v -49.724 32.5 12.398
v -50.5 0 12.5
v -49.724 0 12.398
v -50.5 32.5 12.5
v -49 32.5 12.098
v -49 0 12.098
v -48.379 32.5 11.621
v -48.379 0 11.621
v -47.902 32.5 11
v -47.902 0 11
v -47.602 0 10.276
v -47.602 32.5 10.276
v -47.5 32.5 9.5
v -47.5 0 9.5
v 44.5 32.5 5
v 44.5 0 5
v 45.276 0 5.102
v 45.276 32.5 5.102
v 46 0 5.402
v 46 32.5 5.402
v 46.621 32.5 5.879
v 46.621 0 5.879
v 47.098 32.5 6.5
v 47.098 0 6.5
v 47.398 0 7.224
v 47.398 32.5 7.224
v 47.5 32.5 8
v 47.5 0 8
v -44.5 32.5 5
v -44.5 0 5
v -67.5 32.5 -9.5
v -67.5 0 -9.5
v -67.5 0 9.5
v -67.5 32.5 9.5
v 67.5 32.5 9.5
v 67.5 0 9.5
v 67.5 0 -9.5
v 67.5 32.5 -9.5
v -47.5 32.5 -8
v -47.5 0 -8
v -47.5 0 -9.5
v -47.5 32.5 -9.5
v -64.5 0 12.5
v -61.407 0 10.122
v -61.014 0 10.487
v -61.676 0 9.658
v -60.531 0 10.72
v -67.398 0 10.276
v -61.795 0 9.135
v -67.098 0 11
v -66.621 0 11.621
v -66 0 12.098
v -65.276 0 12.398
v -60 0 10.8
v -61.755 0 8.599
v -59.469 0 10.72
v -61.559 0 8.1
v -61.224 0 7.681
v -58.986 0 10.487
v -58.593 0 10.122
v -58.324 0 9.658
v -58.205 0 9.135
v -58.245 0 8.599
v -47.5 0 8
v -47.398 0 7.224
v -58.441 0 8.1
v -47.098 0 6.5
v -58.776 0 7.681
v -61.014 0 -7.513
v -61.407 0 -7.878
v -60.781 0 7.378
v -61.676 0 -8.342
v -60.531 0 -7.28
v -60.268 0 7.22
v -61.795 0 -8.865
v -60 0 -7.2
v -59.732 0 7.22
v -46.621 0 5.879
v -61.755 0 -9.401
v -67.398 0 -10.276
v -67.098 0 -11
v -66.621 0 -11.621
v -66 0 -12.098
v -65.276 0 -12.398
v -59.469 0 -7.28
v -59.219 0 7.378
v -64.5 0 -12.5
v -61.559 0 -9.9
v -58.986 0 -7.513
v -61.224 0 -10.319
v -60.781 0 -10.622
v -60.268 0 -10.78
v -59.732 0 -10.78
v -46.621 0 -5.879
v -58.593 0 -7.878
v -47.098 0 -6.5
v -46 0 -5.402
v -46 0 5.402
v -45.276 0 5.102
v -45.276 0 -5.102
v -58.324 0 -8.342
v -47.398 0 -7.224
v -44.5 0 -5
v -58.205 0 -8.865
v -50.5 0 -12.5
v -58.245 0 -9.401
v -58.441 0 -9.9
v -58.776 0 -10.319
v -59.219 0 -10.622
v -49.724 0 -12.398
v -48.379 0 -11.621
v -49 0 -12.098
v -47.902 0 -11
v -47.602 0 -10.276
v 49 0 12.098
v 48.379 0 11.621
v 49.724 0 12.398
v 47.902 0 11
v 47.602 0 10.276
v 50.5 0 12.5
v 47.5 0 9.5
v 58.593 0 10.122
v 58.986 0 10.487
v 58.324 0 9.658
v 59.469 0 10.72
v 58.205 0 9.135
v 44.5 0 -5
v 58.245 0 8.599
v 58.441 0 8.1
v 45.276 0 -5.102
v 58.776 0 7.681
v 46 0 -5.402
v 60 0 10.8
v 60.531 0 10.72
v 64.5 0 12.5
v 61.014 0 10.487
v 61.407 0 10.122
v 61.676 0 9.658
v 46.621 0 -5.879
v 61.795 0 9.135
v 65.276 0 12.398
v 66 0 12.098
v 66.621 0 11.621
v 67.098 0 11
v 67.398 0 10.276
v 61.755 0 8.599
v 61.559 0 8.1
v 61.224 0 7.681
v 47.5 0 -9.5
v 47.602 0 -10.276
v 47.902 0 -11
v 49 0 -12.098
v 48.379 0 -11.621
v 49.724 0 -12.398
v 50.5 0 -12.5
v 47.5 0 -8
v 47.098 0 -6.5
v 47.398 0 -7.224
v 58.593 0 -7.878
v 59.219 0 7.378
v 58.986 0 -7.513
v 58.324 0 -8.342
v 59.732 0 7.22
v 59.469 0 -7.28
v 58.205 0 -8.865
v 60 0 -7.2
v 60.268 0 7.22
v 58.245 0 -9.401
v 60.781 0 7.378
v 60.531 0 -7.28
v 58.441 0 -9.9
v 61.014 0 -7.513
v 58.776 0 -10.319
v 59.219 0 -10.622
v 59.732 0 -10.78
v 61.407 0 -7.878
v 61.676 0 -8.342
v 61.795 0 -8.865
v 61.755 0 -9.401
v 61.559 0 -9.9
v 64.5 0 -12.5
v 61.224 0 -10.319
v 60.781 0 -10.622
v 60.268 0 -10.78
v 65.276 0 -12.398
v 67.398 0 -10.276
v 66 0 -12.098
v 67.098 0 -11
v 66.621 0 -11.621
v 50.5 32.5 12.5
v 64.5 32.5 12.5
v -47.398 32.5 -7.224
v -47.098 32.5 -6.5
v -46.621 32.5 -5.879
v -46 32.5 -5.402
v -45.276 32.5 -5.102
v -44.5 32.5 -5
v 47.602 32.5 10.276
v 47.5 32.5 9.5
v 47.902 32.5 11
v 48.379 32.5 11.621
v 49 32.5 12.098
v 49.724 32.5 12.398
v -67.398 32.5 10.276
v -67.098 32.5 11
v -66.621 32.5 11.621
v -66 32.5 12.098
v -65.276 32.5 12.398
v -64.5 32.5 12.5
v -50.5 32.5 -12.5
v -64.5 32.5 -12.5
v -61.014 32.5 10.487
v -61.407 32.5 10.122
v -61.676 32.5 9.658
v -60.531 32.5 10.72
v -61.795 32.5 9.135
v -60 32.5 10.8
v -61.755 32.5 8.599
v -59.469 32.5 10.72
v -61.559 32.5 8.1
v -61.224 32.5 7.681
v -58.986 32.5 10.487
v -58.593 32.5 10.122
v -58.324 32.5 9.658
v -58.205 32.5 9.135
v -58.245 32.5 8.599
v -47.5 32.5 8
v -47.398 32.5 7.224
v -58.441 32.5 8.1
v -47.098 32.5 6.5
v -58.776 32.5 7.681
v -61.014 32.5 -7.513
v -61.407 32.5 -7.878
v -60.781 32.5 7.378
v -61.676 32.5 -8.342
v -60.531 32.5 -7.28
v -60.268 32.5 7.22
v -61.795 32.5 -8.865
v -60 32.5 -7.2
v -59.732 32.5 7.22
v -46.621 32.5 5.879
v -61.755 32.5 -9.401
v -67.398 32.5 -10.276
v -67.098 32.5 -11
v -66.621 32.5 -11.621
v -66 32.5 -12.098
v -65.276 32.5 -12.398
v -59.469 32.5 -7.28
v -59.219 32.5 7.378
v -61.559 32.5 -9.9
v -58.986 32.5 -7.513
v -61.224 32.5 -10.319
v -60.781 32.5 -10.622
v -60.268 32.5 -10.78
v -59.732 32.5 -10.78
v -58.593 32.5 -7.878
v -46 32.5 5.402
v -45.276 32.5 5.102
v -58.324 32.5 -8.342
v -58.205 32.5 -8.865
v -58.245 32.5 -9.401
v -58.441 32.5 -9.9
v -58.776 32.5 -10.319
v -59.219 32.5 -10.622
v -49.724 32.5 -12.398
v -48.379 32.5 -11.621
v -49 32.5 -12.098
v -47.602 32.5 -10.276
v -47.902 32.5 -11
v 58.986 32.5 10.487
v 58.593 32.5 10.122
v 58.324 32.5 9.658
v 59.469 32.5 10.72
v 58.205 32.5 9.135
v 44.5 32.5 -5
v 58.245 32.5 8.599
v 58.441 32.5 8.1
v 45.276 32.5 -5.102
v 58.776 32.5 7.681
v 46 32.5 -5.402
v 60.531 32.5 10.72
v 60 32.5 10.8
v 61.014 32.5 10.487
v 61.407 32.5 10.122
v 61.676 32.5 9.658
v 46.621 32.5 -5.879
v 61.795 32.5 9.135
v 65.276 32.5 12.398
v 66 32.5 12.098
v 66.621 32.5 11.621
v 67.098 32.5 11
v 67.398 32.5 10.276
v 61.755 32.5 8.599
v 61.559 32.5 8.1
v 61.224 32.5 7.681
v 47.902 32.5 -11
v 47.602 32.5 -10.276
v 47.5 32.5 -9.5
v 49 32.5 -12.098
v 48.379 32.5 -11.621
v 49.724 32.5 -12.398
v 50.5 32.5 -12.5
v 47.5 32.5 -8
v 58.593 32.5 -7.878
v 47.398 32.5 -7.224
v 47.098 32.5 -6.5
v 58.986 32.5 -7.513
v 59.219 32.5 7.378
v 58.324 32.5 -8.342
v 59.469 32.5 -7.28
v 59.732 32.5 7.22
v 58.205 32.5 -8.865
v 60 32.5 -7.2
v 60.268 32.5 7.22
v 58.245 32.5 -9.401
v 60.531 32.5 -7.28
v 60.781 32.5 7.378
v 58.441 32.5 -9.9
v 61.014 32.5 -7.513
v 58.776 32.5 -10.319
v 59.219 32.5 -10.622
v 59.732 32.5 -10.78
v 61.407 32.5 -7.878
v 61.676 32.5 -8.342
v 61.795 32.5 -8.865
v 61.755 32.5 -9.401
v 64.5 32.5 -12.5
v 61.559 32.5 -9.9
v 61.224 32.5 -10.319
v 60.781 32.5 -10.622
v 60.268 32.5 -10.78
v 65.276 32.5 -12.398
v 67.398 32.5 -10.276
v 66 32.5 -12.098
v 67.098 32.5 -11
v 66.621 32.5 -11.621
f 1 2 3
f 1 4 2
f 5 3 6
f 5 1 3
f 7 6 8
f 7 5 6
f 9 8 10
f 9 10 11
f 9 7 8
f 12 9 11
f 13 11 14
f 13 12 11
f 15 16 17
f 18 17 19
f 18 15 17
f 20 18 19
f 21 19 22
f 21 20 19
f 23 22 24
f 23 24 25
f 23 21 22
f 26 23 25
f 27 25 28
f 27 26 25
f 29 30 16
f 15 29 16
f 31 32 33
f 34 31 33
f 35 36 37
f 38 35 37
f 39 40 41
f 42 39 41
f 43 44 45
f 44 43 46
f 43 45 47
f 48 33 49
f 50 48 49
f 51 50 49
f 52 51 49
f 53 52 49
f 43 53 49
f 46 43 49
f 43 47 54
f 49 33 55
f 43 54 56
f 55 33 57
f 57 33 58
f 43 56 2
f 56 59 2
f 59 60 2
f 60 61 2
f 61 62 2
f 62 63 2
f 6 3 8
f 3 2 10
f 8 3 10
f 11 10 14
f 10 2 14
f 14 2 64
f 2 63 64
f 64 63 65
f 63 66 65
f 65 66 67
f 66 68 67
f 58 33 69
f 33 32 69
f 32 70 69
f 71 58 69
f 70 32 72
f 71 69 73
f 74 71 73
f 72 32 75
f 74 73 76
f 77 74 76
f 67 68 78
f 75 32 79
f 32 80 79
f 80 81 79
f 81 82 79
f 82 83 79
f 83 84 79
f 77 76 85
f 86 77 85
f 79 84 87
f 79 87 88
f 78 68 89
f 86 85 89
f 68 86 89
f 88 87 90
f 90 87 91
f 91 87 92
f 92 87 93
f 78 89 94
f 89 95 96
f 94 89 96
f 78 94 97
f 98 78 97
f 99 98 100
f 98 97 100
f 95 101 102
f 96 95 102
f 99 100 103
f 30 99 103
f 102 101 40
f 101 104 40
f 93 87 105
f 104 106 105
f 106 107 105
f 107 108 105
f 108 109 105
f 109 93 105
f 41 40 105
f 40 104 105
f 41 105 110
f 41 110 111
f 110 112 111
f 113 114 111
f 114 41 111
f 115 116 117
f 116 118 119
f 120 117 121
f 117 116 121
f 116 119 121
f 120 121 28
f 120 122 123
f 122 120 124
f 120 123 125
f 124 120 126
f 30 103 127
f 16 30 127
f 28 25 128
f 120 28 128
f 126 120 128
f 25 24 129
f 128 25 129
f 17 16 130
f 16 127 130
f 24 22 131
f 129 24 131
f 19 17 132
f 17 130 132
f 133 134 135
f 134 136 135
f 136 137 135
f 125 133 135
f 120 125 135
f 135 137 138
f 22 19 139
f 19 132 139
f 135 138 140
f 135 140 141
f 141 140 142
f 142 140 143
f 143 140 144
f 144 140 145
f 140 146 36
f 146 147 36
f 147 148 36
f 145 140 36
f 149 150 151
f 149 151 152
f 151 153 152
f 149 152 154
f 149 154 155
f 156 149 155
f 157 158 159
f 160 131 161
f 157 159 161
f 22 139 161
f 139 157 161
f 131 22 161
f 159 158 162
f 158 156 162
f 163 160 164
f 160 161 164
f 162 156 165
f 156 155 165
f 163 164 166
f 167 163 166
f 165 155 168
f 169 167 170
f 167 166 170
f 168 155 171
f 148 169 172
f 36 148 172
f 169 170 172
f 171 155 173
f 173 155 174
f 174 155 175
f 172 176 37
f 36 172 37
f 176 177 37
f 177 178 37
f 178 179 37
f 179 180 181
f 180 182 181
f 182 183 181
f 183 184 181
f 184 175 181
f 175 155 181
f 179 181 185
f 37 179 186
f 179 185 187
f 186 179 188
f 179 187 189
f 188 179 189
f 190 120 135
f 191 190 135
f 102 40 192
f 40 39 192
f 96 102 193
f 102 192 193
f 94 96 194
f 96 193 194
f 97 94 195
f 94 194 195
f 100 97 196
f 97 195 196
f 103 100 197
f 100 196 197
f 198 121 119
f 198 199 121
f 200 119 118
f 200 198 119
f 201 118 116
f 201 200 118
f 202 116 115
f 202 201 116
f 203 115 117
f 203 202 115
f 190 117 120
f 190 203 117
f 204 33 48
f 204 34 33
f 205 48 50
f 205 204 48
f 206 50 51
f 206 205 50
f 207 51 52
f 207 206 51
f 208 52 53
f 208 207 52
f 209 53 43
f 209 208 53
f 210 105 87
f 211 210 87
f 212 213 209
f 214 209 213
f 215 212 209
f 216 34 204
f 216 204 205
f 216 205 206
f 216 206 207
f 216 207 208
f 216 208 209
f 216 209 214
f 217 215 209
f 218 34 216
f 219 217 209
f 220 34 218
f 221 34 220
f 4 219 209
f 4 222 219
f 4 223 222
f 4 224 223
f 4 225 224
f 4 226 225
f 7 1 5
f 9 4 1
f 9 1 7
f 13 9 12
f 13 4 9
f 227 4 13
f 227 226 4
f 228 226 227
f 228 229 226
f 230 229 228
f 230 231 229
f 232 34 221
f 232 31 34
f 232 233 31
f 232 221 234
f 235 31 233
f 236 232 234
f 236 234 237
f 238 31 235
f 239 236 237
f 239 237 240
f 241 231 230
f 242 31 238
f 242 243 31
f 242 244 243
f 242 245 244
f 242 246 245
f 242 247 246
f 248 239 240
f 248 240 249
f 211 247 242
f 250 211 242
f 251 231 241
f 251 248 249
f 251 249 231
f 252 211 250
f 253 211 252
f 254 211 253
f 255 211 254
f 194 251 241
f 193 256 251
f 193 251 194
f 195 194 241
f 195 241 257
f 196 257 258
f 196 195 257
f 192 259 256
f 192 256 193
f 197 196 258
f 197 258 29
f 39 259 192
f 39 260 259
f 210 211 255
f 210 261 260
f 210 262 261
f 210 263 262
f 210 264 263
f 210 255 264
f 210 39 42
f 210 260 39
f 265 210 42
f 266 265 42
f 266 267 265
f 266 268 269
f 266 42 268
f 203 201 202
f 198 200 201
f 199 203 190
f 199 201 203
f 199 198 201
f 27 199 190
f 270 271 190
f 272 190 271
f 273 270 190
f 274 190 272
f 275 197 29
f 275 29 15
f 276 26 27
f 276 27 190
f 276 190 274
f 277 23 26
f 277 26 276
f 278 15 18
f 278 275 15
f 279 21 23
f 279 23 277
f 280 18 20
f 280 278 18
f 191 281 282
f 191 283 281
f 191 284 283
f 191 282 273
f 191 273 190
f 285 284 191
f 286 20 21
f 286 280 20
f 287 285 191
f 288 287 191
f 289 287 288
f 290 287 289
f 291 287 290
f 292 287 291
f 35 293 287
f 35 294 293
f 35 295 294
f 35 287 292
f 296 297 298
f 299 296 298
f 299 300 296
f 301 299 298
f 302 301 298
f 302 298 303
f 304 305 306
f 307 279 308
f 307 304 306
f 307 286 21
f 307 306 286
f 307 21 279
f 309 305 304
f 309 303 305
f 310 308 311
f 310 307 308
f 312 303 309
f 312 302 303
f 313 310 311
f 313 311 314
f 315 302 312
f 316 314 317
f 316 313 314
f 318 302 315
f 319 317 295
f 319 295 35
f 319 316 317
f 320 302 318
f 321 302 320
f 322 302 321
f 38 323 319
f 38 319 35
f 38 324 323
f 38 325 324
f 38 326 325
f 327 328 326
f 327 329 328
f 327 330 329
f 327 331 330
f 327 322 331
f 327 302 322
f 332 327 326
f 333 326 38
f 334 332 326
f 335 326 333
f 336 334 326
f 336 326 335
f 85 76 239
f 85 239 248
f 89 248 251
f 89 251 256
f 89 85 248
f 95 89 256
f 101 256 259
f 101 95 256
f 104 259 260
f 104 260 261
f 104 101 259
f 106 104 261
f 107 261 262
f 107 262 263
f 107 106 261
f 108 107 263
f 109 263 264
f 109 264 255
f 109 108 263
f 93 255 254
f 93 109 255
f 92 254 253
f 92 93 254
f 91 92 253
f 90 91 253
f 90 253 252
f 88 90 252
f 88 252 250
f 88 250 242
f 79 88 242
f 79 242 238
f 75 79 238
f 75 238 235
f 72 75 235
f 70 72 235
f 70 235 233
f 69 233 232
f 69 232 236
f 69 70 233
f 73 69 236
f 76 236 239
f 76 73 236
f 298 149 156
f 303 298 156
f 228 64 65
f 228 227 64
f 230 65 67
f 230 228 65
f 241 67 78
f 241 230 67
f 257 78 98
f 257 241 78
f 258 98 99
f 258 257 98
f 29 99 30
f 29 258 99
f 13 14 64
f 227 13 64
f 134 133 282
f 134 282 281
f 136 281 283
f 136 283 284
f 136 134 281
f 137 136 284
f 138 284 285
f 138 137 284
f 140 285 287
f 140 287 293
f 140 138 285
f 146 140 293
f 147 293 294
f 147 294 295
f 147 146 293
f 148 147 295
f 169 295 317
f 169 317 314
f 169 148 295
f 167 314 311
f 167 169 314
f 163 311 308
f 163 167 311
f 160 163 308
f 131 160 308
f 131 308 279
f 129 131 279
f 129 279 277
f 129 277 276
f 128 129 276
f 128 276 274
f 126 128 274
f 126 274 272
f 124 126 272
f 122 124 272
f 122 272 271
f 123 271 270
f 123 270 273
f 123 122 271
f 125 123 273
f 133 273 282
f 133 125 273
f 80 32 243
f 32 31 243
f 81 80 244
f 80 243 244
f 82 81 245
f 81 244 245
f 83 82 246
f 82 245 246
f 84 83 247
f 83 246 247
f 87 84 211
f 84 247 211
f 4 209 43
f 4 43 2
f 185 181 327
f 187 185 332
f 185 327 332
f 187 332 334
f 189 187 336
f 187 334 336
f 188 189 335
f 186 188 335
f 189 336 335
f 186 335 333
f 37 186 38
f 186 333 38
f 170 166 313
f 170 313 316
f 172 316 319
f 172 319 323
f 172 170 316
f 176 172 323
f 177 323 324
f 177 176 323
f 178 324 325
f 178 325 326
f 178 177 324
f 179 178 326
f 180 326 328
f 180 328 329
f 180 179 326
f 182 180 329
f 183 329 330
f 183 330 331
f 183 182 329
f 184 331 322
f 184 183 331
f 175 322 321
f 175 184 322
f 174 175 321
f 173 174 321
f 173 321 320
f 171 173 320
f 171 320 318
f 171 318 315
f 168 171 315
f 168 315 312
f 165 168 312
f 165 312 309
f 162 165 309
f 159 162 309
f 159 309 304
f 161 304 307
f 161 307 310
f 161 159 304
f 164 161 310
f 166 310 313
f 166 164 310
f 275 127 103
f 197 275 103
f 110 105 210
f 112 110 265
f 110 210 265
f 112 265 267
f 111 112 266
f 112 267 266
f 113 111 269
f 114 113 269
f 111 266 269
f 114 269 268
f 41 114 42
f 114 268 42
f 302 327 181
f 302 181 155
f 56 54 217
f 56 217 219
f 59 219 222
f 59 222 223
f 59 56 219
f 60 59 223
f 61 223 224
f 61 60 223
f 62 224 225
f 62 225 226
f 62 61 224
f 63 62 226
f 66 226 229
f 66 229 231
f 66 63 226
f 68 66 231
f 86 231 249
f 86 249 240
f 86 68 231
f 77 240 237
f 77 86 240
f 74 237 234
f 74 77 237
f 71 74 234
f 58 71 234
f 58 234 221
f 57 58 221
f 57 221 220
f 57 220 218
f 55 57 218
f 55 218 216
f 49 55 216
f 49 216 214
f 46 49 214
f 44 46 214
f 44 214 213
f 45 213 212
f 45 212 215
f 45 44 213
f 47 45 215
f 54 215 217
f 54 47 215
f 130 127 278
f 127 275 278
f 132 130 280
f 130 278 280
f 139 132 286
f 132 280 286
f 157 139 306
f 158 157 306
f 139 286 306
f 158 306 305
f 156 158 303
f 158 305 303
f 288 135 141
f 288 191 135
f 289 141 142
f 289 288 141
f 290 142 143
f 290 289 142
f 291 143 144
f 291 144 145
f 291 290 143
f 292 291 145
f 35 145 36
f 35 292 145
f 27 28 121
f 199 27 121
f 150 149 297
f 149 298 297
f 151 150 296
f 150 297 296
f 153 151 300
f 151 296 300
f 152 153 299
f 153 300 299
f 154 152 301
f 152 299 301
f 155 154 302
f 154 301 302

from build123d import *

# Parameters (mm, degrees)
SKETCH_1_R      = 1.8
EXTRUDE_1_DEPTH = 32.5
FILLET_1_R      = 3


with BuildPart() as part:
    # 草图1 → 凸台-拉伸1 (new body)
    with BuildSketch(Plane(origin=(0, 0, 0), x_dir=(1, 0, 0), z_dir=(0, 1, 0))):
        Polygon((-67.5, 12.5), (-67.5, -12.5), (-47.5, -12.5), (-47.5, -5), (47.5, -5), (47.5, -12.5), (67.5, -12.5), (67.5, 12.5), (47.5, 12.5), (47.5, 5), (-47.5, 5), (-47.5, 12.5), align=None)
        with Locations(Location((-60, -9, 0), (0, 0, 270))):
            Circle(SKETCH_1_R, mode=Mode.SUBTRACT)
        with Locations(Location((60, -9, 0), (0, 0, 270))):
            Circle(SKETCH_1_R, mode=Mode.SUBTRACT)
        with Locations(Location((-60, 9, 0), (0, 0, 270))):
            Circle(SKETCH_1_R, mode=Mode.SUBTRACT)
        with Locations(Location((60, 9, 0), (0, 0, 270))):
            Circle(SKETCH_1_R, mode=Mode.SUBTRACT)
    extrude(amount=EXTRUDE_1_DEPTH)

    # 圆角1
    fillet_1_edges = [part.edges().sort_by_distance(p)[0] for p in [
        (47.5, 16.25, -12.5),
        (67.5, 16.25, -12.5),
        (67.5, 16.25, 12.5),
        (47.5, 16.25, 12.5),
        (47.5, 16.25, 5),
        (-47.5, 16.25, 5),
        (-47.5, 16.25, 12.5),
        (-67.5, 16.25, 12.5),
        (-67.5, 16.25, -12.5),
        (-47.5, 16.25, -12.5),
        (-47.5, 16.25, -5),
        (47.5, 16.25, -5),
    ]]
    fillet(fillet_1_edges, radius=FILLET_1_R)


solid = part.part
